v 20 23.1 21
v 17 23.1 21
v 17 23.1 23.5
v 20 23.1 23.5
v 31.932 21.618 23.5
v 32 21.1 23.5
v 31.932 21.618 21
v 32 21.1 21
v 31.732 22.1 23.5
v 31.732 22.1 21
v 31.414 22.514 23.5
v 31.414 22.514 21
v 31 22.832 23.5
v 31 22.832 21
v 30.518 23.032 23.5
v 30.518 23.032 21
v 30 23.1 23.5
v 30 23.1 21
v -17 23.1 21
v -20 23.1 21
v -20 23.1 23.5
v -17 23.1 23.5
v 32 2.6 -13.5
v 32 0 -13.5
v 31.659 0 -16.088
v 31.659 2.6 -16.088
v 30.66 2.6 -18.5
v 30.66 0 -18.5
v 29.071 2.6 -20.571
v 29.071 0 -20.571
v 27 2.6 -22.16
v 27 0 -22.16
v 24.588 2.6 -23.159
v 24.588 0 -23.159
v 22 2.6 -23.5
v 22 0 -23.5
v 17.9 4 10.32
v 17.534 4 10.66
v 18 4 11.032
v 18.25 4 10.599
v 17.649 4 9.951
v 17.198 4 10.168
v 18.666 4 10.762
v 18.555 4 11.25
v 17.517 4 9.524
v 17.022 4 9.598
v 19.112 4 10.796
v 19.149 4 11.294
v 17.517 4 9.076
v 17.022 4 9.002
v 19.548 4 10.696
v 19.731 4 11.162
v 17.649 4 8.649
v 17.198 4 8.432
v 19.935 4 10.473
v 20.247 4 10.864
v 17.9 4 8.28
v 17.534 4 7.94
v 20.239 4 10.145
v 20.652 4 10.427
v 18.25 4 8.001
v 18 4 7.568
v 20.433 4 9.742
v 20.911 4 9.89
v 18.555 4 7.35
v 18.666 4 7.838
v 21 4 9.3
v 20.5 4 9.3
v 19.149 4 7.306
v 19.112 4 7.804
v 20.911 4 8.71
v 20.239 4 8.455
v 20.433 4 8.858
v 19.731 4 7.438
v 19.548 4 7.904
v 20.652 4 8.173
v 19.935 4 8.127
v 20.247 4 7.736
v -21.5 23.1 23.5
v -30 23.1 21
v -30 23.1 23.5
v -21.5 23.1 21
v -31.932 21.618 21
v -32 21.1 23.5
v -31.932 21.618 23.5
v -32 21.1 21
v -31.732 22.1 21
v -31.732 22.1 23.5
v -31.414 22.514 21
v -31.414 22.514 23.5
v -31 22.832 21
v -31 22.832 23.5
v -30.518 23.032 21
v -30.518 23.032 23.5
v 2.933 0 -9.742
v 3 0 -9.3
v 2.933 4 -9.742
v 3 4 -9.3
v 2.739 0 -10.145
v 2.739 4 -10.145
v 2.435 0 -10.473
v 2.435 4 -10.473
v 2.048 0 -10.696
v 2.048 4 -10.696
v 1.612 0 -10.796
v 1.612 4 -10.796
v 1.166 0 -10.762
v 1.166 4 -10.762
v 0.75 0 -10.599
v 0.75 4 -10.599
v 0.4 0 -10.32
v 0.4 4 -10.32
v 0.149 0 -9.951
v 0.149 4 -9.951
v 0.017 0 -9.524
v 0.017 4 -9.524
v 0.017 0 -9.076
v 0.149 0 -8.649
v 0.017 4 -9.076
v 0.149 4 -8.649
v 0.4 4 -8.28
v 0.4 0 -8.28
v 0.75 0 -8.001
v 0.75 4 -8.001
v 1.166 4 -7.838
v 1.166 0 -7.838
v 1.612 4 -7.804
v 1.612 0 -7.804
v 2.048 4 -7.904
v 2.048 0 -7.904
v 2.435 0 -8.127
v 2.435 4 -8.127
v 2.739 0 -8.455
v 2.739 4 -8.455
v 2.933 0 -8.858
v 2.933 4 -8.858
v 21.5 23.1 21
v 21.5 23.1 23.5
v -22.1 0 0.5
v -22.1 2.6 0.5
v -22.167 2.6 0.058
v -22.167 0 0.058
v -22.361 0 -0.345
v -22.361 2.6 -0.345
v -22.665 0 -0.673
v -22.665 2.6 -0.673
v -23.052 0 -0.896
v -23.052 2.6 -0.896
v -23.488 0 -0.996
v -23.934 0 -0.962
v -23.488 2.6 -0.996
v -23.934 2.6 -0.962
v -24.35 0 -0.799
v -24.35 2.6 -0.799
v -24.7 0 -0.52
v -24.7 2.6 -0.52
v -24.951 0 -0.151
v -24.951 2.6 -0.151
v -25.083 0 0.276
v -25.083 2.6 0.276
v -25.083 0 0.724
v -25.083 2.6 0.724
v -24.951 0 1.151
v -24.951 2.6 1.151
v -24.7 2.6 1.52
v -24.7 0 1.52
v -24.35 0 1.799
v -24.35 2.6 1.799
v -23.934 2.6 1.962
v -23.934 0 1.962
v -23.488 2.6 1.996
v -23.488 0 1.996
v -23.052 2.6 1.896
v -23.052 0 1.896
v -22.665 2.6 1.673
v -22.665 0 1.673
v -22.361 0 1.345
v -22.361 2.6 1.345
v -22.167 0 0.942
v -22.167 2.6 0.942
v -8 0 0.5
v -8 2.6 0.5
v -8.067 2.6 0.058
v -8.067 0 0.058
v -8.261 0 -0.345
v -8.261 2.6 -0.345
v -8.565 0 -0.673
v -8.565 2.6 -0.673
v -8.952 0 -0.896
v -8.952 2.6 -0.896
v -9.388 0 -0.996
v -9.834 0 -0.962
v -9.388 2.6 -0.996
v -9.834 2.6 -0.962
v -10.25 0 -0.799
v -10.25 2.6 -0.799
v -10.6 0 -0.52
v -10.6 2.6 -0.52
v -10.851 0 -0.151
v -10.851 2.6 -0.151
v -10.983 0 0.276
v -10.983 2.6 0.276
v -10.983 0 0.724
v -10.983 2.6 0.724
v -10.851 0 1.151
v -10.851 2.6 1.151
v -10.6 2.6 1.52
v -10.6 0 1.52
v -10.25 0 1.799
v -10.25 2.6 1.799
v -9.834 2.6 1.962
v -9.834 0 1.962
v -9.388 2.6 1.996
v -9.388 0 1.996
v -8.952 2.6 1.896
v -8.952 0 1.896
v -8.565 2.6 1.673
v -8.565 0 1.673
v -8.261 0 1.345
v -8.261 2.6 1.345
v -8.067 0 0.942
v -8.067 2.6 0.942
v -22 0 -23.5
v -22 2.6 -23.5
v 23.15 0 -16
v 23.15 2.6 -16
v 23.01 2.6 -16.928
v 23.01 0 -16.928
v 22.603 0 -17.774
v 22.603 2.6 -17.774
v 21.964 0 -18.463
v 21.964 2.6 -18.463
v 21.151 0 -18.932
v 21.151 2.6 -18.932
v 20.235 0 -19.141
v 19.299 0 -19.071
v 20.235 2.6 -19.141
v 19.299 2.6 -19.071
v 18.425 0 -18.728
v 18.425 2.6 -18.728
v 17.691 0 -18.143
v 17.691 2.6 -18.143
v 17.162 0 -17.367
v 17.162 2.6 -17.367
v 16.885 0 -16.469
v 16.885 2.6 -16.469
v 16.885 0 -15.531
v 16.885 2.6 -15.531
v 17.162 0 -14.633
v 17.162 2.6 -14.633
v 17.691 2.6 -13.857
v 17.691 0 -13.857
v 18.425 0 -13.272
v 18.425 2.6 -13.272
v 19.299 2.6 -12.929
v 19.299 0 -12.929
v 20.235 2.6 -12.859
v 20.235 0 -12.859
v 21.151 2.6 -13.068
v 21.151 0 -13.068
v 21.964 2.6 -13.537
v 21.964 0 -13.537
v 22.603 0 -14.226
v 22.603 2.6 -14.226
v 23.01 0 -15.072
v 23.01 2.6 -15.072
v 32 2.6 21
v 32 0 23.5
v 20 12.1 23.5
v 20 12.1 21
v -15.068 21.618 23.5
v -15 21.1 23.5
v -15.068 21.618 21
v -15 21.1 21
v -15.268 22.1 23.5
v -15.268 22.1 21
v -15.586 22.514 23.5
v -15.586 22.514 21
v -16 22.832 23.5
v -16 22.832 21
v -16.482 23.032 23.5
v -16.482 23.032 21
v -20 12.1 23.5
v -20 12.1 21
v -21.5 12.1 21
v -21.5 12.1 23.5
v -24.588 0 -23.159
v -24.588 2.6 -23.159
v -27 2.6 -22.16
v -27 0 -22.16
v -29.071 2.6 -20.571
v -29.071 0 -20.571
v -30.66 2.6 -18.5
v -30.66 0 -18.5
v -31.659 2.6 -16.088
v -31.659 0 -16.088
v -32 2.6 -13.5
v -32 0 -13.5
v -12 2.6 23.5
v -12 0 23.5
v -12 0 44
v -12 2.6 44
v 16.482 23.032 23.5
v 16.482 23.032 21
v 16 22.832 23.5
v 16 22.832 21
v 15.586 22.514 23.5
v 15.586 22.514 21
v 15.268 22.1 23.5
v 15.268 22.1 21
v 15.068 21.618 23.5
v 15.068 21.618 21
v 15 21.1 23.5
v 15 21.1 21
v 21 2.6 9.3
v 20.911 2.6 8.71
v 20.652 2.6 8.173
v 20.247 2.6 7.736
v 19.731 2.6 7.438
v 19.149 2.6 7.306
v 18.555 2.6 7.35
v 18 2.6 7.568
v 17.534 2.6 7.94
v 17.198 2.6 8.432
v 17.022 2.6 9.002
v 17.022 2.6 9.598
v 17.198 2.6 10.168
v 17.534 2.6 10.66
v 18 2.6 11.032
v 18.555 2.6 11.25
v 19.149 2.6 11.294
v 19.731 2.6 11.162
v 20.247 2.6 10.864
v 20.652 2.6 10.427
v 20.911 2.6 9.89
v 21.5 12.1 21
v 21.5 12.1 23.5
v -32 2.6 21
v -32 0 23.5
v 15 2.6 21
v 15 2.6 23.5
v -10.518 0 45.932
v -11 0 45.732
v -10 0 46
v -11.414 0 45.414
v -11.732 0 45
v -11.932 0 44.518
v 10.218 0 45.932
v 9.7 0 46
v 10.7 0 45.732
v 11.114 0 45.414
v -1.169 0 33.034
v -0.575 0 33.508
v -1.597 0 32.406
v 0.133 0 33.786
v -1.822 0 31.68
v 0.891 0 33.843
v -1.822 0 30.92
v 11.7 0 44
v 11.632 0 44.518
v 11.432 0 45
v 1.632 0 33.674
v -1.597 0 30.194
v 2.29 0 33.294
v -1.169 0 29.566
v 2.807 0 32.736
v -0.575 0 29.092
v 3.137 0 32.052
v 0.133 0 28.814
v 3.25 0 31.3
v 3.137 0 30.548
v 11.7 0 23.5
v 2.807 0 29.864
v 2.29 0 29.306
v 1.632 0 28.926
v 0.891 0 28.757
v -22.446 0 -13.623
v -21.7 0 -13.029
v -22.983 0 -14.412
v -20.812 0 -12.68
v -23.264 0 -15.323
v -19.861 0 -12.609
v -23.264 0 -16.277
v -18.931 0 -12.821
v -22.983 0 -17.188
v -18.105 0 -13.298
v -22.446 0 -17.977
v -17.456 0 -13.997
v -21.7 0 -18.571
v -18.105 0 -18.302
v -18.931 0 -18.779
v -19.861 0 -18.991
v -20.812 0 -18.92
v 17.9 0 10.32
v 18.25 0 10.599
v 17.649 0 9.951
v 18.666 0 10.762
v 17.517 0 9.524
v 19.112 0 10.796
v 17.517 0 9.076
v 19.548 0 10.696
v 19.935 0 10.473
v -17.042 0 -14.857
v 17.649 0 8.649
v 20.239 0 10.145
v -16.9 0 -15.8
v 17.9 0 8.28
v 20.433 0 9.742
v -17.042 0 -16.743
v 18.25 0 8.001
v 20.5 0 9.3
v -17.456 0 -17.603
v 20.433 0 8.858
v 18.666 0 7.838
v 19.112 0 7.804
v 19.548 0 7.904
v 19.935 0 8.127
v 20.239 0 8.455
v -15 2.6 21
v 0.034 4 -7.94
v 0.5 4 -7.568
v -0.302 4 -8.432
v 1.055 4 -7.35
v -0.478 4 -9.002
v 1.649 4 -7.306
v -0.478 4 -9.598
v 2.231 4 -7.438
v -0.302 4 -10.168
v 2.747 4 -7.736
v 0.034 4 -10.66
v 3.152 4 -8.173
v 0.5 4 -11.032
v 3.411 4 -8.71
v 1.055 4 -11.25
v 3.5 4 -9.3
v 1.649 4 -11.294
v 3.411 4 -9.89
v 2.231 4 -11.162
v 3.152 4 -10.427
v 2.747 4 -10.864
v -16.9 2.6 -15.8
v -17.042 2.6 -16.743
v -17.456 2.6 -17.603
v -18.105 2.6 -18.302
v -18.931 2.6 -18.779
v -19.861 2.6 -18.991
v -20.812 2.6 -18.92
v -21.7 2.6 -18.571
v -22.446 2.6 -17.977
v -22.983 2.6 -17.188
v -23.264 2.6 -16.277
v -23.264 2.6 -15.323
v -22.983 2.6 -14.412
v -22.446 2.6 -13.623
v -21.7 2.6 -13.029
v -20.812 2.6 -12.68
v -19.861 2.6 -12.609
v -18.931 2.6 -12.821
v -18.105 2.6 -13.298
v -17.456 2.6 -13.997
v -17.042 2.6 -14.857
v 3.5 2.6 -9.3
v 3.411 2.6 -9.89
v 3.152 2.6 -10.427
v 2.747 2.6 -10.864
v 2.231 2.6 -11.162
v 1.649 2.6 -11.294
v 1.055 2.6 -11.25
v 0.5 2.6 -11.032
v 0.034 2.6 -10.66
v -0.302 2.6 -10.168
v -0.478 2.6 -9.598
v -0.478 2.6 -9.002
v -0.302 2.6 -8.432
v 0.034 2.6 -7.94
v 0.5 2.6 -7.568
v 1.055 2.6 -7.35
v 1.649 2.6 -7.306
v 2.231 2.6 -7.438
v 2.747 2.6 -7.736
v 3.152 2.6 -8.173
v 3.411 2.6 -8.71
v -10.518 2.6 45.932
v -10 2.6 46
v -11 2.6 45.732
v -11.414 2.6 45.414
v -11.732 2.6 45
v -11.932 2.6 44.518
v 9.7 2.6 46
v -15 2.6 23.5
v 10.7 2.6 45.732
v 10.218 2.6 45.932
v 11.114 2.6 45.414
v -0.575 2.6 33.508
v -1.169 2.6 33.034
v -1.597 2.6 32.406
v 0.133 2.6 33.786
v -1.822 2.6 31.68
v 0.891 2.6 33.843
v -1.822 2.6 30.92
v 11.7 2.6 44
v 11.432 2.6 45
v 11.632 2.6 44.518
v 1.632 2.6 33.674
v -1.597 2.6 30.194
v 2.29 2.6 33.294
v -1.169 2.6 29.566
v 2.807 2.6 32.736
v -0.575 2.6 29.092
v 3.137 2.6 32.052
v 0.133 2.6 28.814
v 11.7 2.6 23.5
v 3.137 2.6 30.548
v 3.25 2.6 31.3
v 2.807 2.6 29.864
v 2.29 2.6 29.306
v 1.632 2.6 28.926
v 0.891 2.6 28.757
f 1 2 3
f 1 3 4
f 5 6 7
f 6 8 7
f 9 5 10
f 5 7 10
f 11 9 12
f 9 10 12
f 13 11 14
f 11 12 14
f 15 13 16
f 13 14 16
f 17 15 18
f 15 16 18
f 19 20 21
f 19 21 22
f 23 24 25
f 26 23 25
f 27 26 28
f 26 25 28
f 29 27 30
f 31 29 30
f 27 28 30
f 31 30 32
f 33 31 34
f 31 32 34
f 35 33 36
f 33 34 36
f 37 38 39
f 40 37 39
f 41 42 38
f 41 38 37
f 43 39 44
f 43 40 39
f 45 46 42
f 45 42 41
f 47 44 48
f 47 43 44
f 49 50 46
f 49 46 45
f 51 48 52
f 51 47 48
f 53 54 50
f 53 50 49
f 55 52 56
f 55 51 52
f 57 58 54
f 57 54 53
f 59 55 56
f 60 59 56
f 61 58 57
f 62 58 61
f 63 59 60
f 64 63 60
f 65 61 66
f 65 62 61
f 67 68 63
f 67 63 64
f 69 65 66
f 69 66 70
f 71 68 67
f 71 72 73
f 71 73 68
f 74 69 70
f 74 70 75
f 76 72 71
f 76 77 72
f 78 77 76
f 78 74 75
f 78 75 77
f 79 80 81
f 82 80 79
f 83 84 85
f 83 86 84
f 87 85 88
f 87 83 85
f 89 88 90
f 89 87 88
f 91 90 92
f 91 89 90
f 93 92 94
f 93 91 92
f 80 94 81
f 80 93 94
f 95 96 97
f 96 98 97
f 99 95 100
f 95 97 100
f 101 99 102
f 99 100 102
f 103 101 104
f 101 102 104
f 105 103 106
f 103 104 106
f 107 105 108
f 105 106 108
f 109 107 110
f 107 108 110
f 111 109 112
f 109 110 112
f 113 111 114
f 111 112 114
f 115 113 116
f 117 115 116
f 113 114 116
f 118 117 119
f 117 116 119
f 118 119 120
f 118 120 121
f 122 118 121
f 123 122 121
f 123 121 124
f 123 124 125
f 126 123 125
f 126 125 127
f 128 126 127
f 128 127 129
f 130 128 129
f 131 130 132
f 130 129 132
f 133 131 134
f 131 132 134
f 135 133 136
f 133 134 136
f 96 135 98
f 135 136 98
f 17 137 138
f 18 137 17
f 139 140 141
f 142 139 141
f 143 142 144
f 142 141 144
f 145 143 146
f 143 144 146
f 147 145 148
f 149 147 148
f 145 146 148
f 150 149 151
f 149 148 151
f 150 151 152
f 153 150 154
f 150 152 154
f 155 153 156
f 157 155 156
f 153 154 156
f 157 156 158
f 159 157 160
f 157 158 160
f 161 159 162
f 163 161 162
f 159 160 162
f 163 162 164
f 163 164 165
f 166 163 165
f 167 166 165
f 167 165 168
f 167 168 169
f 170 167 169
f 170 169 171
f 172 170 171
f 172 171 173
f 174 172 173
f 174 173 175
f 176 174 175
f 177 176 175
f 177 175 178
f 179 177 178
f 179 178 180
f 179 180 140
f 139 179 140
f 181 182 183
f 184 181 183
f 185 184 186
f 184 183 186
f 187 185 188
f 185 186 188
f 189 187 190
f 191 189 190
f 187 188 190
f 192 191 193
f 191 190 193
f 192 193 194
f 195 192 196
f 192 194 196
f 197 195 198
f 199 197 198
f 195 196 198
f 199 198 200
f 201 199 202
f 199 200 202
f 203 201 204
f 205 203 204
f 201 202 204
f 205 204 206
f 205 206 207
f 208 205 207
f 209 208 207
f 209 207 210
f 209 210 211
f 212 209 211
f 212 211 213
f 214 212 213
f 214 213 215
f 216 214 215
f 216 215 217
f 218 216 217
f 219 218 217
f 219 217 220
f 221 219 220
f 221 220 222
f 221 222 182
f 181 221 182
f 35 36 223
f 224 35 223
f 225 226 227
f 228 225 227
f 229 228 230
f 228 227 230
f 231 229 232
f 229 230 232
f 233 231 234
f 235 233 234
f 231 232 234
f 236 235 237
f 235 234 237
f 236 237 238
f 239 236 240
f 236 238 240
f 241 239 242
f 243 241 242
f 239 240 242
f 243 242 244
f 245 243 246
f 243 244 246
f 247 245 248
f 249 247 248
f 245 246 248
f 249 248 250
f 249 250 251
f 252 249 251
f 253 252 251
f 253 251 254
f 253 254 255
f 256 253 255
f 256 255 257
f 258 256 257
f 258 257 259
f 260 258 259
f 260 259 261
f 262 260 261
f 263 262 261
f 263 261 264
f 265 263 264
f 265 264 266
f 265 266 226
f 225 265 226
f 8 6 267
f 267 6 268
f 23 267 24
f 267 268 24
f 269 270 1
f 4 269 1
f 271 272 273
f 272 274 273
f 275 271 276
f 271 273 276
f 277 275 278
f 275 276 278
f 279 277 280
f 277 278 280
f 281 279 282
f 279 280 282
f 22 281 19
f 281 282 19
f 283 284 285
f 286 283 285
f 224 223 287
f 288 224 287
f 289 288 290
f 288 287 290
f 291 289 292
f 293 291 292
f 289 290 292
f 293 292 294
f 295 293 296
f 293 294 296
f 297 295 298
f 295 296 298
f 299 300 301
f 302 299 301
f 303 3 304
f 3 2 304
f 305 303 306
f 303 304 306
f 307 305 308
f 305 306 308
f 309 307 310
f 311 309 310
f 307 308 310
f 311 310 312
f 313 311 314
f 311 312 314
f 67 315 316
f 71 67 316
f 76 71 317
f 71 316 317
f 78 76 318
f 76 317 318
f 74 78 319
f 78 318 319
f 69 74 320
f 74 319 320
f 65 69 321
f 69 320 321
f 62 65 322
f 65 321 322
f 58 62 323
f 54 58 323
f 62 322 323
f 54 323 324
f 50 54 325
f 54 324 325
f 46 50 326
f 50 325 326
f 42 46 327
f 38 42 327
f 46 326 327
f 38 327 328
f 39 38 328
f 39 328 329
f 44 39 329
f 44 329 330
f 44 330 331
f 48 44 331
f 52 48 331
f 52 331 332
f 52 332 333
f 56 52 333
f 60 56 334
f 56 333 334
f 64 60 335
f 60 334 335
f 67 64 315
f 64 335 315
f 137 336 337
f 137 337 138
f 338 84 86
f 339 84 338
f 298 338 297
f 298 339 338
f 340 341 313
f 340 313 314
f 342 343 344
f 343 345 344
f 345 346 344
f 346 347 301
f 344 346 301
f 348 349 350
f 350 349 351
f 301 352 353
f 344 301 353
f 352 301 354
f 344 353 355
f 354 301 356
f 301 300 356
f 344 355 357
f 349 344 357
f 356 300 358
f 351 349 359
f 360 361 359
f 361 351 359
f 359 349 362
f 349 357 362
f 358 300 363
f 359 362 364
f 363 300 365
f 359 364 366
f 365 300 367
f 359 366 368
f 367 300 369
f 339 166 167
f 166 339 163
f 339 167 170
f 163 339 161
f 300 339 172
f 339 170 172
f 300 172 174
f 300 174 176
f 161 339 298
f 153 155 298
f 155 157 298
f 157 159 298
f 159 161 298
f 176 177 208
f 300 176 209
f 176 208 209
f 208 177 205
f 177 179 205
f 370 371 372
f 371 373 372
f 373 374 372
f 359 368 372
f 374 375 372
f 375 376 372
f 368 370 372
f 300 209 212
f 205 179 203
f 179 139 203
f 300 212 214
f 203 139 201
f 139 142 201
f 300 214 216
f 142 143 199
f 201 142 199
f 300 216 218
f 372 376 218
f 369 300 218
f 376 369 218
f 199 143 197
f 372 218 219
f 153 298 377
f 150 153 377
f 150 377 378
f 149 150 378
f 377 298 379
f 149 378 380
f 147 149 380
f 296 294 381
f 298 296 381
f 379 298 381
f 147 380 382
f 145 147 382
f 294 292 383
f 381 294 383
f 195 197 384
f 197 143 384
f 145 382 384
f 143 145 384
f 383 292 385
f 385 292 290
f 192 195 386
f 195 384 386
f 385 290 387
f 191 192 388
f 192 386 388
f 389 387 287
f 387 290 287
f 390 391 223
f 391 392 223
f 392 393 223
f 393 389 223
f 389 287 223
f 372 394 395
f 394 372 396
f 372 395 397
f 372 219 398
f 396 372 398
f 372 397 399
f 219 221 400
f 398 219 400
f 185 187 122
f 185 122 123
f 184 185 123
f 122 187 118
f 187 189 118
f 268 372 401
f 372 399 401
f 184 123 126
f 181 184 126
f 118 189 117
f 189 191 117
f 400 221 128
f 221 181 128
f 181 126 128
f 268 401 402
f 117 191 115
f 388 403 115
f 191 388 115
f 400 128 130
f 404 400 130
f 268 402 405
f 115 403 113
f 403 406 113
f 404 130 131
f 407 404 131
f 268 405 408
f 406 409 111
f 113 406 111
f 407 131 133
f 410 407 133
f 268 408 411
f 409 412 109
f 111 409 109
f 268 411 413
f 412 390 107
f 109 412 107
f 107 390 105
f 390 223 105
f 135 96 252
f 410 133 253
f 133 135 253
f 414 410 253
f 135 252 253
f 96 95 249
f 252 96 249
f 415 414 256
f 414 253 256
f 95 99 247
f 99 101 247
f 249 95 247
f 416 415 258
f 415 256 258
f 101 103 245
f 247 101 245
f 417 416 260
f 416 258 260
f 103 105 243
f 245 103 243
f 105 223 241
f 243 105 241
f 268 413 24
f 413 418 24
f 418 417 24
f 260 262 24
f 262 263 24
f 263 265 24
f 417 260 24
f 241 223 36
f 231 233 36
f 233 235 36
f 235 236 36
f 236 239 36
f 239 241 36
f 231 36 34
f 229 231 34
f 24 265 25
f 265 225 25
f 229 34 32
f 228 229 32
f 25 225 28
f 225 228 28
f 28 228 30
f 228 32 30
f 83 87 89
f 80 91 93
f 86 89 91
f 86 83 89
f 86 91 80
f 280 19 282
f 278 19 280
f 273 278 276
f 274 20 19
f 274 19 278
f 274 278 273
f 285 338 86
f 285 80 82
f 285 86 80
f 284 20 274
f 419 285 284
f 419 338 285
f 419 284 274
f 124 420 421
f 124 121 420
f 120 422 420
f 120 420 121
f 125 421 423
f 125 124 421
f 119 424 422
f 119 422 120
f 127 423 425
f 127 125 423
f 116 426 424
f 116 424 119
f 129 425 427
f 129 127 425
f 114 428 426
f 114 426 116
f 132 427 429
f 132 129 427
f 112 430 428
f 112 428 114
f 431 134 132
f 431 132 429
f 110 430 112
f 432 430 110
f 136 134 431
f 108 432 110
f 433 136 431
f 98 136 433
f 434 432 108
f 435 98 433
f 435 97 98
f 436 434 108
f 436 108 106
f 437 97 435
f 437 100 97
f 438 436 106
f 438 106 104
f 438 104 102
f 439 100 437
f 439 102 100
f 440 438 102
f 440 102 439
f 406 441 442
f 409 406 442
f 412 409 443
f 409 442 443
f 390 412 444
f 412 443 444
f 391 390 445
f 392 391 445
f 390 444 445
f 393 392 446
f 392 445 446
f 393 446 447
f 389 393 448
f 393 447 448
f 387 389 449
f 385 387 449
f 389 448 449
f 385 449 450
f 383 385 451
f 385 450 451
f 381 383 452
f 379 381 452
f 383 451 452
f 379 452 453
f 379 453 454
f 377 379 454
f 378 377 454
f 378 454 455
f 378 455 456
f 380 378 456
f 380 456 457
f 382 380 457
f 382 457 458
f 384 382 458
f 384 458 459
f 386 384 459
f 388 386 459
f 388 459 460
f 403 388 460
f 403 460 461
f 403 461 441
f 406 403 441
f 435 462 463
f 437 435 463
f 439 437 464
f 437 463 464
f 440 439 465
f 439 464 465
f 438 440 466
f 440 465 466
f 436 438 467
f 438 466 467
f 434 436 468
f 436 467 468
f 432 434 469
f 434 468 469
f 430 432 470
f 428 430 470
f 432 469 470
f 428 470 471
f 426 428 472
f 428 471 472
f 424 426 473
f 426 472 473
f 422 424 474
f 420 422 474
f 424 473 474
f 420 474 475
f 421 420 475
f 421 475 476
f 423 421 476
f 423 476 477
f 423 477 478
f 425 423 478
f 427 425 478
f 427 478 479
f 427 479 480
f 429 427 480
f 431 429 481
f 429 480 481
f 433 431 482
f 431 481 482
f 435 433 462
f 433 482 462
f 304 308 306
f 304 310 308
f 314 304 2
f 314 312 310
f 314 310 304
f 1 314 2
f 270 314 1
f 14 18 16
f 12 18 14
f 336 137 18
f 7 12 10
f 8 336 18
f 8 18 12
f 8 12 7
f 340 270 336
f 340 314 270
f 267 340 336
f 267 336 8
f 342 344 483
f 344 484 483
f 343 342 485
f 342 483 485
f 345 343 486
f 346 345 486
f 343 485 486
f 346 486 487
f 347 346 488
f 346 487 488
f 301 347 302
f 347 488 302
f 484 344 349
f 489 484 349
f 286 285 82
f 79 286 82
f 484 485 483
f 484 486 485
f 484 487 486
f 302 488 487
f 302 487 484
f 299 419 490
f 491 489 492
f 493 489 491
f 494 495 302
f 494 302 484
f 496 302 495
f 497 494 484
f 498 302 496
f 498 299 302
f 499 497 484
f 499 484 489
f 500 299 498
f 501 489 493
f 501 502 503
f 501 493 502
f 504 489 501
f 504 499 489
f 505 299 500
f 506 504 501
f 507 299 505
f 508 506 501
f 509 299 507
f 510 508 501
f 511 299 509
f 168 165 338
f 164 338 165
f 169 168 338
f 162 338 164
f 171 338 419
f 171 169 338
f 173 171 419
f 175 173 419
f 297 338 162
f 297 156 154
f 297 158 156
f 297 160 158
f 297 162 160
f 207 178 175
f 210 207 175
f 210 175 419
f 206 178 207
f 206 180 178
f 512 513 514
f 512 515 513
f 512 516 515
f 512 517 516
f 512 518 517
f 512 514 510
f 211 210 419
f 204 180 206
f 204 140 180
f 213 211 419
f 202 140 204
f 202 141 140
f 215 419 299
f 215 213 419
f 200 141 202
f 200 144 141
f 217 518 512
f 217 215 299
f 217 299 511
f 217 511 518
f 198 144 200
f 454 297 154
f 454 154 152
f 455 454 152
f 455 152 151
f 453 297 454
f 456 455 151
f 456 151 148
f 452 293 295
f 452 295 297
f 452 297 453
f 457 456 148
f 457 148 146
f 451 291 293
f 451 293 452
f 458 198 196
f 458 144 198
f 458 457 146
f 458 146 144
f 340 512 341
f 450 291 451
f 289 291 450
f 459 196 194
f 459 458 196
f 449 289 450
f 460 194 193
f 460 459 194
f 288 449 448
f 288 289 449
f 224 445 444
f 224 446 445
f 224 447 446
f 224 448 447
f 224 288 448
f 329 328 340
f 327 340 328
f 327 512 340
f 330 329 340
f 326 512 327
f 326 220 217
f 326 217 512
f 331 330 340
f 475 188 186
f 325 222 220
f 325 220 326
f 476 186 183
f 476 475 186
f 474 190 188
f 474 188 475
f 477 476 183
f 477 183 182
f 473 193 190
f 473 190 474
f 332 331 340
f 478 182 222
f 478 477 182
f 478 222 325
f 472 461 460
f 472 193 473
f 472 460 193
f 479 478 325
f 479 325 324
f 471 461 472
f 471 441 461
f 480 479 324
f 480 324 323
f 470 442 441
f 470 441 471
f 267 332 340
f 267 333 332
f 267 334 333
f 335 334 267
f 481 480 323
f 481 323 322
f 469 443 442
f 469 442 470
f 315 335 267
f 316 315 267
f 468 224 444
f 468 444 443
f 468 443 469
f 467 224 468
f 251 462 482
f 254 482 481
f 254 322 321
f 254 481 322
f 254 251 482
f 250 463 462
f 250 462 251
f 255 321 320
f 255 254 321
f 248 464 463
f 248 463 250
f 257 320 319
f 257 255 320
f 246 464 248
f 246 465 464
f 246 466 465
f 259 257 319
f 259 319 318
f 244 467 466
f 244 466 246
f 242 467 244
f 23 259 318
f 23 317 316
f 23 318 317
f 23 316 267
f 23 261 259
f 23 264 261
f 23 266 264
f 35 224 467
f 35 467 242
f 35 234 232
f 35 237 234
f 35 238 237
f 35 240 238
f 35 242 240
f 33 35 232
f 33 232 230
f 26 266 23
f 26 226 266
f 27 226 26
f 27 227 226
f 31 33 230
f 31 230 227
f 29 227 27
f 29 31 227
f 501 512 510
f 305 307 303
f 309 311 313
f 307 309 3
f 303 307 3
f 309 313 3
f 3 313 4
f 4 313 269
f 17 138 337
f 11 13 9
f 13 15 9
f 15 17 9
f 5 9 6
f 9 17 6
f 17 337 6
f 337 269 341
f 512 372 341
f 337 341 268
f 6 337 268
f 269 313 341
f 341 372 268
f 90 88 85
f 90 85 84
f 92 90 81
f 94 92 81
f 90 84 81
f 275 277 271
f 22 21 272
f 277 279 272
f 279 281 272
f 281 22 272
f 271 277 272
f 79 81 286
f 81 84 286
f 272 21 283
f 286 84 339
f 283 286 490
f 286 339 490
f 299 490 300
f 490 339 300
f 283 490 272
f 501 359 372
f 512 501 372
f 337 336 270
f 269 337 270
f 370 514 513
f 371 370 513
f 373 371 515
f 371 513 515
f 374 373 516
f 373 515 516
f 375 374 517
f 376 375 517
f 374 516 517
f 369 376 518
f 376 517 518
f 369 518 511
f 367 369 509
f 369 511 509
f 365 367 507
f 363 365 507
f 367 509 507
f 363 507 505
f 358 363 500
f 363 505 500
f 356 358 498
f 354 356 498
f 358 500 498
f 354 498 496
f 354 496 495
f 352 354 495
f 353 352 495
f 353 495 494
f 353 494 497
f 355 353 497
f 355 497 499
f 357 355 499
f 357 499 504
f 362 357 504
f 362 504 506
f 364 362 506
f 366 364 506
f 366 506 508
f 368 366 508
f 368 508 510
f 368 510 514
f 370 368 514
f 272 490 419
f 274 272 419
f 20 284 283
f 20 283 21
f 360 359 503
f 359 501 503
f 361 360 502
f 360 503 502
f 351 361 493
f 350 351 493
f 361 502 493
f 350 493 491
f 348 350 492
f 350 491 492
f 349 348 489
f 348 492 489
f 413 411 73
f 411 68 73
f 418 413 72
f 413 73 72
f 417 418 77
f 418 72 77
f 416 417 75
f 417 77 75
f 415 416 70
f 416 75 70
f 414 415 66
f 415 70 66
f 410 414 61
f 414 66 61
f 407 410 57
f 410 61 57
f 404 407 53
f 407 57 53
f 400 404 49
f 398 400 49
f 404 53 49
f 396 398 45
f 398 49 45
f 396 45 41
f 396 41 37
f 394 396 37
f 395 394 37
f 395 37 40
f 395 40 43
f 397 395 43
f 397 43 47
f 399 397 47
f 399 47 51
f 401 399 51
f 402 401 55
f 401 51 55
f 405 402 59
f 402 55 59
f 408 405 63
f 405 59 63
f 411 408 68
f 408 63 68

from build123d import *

# Parameters (mm, degrees)
MAIN_BODY_DEPTH          = 2.6
SKETCH4_W                = 17
SKETCH4_H                = 2.5
FLANGES_DEPTH            = 20.5
SKETCH5_R                = 2
DRILL_HOLD_EXTRUDE_DEPTH = 1.4
SKETCH2_R                = 3.2
SKETCH2_R_2              = 3.15
SKETCH2_R_3              = 1.5
SKETCH2_R_4              = 2.55
SCREW_HOLES_DEPTH        = 21.5
SCREW_HOLES_DEPTH_BACK   = 3.6
FLANGE_FILLET_R          = 2
SKETCH6_W                = 1.5
SKETCH6_H                = 11
FLANGE_NOTCHES_DEPTH     = 26
MAIN_LOWER_BODY_FILLET_R = 2


with BuildPart() as part:
    # Sketch1 → Main Body (new body)
    with BuildSketch(Plane(origin=(0, 0, 0), x_dir=(1, 0, 0), z_dir=(0, 1, 0))):
        with BuildLine():
            Line((11.7, -23.5), (32, -23.5))
            Line((32, -23.5), (32, 13.5))
            ThreePointArc((32, 13.5), (29.071067812, 20.571067812), (22, 23.5))
            Line((22, 23.5), (-22, 23.5))
            ThreePointArc((-22, 23.5), (-29.071067812, 20.571067812), (-32, 13.5))
            Line((-32, 13.5), (-32, -23.5))
            Line((-32, -23.5), (-12, -23.5))
            Line((-12, -23.5), (-12, -46))
            Line((-12, -46), (11.7, -46))
            Line((11.7, -46), (11.7, -23.5))
        make_face()
    extrude(amount=MAIN_BODY_DEPTH)

    # Sketch4 → Flanges (add)
    with BuildSketch(Plane(origin=(0, 2.6, 0), x_dir=(1, 0, 0), z_dir=(0, 1, 0))):
        with Locations((-23.5, -22.25)):
            Rectangle(SKETCH4_W, SKETCH4_H)
        with Locations((23.5, -22.25)):
            Rectangle(SKETCH4_W, SKETCH4_H)
    extrude(amount=FLANGES_DEPTH)

    # Sketch5 → Drill hold extrude (add)
    with BuildSketch(Plane(origin=(0, 2.6, 0), x_dir=(1, 0, 0), z_dir=(0, 1, 0))):
        with Locations((19, -9.3)):
            Circle(SKETCH5_R)
        with Locations((1.5, 9.3)):
            Circle(SKETCH5_R)
    extrude(amount=DRILL_HOLD_EXTRUDE_DEPTH)

    # Sketch2 → Screw holes (cut, two sides)
    with BuildSketch(Plane(origin=(0, 2.6, 0), x_dir=(1, 0, 0), z_dir=(0, 1, 0))) as screw_holes_sk:
        with Locations((-20.1, 15.8)):
            Circle(SKETCH2_R)
        with Locations((20, 16)):
            Circle(SKETCH2_R_2)
        with Locations((1.5, 9.3)):
            Circle(SKETCH2_R_3)
        with Locations((-23.6, -0.5)):
            Circle(SKETCH2_R_3)
        with Locations((-9.5, -0.5)):
            Circle(SKETCH2_R_3)
        with Locations((19, -9.3)):
            Circle(SKETCH2_R_3)
        with Locations((0.7, -31.3)):
            Circle(SKETCH2_R_4)
    extrude(amount=SCREW_HOLES_DEPTH, mode=Mode.SUBTRACT)
    extrude(screw_holes_sk.sketch, amount=-SCREW_HOLES_DEPTH_BACK, mode=Mode.SUBTRACT)

    # Flange Fillet
    flange_fillet_edges = [part.edges().sort_by_distance(p)[0] for p in [
        (-32, 23.1, 22.25),
        (-15, 23.1, 22.25),
        (32, 23.1, 22.25),
        (15, 23.1, 22.25),
    ]]
    fillet(flange_fillet_edges, radius=FLANGE_FILLET_R)

    # Sketch6 → Flange Notches (cut, through all)
    with BuildSketch(Plane(origin=(0, 0, 21), x_dir=(-1, 0, 0), z_dir=(0, 0, -1))):
        with Locations((-20.75, 17.6)):
            Rectangle(SKETCH6_W, SKETCH6_H)
        with Locations((20.75, 17.6)):
            Rectangle(SKETCH6_W, SKETCH6_H)
    extrude(amount=-FLANGE_NOTCHES_DEPTH, mode=Mode.SUBTRACT)

    # Main lower body Fillet
    main_lower_body_fillet_edges = [part.edges().sort_by_distance(p)[0] for p in [
        (11.7, 1.3, 46),
        (-12, 1.3, 46),
    ]]
    fillet(main_lower_body_fillet_edges, radius=MAIN_LOWER_BODY_FILLET_R)


solid = part.part
